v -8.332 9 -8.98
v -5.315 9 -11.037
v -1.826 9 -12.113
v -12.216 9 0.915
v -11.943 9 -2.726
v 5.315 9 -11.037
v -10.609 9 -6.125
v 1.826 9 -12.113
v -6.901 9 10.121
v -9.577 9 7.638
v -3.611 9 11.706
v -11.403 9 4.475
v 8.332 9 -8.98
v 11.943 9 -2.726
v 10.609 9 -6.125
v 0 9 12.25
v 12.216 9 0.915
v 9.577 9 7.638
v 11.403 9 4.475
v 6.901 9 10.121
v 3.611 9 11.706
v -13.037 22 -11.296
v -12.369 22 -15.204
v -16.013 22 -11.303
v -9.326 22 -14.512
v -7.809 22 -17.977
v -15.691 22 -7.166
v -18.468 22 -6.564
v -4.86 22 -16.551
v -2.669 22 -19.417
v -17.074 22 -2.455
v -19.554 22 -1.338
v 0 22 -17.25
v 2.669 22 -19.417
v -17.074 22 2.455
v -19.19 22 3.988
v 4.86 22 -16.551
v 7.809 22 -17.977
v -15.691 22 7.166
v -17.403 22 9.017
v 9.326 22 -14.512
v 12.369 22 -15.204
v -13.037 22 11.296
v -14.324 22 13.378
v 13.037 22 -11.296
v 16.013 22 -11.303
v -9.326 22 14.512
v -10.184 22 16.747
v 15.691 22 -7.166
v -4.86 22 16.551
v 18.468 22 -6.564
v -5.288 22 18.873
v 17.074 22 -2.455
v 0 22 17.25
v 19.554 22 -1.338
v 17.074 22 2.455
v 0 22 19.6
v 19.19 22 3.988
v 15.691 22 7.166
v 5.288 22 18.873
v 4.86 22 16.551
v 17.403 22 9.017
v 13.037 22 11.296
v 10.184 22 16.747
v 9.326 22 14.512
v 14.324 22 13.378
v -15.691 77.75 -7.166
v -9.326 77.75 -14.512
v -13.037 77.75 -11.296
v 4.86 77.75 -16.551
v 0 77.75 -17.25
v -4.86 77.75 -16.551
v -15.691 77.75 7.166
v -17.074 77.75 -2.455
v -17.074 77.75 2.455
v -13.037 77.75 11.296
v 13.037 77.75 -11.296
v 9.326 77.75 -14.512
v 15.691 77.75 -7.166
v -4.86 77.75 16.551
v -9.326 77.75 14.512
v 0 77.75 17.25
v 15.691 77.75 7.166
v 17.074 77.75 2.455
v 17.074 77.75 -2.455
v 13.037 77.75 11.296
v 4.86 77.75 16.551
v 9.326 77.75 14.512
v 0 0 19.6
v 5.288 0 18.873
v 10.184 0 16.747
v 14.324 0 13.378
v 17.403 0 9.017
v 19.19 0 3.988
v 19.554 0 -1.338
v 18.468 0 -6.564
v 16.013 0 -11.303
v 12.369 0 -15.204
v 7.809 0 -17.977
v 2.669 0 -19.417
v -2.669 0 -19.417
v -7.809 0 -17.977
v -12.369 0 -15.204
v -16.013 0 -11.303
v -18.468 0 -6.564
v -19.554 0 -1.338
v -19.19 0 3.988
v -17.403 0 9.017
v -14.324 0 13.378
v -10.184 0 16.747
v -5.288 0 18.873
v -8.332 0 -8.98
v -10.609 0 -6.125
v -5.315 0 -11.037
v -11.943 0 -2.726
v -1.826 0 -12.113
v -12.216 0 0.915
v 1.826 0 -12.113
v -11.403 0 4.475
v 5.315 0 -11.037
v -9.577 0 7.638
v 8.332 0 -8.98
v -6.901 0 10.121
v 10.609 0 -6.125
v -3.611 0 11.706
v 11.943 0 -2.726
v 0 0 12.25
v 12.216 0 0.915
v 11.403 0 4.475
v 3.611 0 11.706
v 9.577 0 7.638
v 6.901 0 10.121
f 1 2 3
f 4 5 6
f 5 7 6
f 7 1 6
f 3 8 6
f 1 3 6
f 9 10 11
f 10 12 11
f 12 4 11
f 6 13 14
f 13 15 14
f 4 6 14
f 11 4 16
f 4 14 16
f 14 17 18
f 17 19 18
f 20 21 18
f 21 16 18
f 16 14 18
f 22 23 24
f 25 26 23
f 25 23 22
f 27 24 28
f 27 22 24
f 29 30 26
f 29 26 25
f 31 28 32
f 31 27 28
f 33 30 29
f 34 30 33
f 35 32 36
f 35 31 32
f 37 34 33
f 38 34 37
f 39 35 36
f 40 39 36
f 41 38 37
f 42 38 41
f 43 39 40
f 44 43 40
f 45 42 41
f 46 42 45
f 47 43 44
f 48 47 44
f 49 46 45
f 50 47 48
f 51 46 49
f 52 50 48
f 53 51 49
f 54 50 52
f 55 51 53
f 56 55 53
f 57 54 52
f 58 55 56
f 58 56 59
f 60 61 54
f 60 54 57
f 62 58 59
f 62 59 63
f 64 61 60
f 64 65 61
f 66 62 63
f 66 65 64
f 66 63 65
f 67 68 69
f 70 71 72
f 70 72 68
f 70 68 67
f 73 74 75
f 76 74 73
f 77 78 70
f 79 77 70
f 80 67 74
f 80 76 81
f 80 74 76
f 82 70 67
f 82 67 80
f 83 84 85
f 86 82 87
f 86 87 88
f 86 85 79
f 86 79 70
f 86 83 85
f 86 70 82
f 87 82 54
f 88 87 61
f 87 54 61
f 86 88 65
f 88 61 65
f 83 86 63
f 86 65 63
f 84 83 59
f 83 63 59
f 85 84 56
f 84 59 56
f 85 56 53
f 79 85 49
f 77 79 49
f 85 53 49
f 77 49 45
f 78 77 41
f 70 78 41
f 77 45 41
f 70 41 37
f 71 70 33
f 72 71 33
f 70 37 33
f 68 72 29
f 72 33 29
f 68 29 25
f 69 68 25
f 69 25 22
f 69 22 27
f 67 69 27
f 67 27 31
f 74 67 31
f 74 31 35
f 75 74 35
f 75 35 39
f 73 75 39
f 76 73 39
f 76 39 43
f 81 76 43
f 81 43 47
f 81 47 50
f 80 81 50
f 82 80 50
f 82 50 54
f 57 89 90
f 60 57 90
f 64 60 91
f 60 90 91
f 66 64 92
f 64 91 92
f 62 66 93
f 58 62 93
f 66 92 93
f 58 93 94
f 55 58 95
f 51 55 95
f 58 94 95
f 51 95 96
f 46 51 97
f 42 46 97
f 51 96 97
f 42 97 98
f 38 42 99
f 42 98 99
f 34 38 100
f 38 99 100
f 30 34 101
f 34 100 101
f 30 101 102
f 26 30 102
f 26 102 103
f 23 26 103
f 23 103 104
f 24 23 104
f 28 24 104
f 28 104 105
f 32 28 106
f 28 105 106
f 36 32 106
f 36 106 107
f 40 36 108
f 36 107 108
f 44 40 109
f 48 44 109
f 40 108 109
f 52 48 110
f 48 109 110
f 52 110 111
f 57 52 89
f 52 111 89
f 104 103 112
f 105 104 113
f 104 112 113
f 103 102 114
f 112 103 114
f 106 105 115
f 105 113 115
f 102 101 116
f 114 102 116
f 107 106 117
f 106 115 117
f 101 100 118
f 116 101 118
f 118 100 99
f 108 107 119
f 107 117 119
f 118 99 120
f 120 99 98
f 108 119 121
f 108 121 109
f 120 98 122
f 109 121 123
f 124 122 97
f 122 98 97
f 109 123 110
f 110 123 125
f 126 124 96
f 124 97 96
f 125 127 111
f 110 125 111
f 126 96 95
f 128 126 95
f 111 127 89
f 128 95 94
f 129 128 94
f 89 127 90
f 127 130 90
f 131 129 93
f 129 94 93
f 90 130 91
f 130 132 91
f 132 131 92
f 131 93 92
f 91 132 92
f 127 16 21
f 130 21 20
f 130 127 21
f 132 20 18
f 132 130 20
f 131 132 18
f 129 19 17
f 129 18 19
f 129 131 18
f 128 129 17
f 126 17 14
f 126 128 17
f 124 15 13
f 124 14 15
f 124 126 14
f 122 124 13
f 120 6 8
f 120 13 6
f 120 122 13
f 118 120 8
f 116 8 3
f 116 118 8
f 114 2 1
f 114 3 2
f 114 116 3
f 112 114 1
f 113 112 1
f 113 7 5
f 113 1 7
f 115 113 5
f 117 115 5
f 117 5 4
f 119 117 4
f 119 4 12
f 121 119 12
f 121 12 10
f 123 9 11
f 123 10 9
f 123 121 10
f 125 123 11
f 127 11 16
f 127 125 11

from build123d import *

# Parameters (mm, degrees)
SKETCH2_R                = 19.6
SKETCH2_R_2              = 12.25
BOSS_EXTRUDE1_DEPTH      = 22
BOSS_EXTRUDE2_DEPTH      = 55.75
BOSS_EXTRUDE2_DEPTH_BACK = 13
SKETCH3_R                = 17.25


with BuildPart() as part:
    # Sketch2 → Boss-Extrude1 (new body)
    with BuildSketch(Plane(origin=(0, 0, 0), x_dir=(1, 0, 0), z_dir=(0, 1, 0))):
        with Locations(Location((0, 0, 0), (0, 0, 270))):
            Circle(SKETCH2_R)
        with Locations(Location((0, 0, 0), (0, 0, 270))):
            Circle(SKETCH2_R_2, mode=Mode.SUBTRACT)
    extrude(amount=BOSS_EXTRUDE1_DEPTH)

    # Sketch3 → Boss-Extrude2 (add, two sides: drawn at the far end of the back side and taken through both)
    with BuildSketch(Plane(origin=(0, 22, 0), x_dir=(1, 0, 0), z_dir=(0, 1, 0)).offset(-BOSS_EXTRUDE2_DEPTH_BACK)):
        with Locations(Location((0, 0, 0), (0, 0, 270))):
            Circle(SKETCH3_R)
    extrude(amount=BOSS_EXTRUDE2_DEPTH + BOSS_EXTRUDE2_DEPTH_BACK)


solid = part.part
